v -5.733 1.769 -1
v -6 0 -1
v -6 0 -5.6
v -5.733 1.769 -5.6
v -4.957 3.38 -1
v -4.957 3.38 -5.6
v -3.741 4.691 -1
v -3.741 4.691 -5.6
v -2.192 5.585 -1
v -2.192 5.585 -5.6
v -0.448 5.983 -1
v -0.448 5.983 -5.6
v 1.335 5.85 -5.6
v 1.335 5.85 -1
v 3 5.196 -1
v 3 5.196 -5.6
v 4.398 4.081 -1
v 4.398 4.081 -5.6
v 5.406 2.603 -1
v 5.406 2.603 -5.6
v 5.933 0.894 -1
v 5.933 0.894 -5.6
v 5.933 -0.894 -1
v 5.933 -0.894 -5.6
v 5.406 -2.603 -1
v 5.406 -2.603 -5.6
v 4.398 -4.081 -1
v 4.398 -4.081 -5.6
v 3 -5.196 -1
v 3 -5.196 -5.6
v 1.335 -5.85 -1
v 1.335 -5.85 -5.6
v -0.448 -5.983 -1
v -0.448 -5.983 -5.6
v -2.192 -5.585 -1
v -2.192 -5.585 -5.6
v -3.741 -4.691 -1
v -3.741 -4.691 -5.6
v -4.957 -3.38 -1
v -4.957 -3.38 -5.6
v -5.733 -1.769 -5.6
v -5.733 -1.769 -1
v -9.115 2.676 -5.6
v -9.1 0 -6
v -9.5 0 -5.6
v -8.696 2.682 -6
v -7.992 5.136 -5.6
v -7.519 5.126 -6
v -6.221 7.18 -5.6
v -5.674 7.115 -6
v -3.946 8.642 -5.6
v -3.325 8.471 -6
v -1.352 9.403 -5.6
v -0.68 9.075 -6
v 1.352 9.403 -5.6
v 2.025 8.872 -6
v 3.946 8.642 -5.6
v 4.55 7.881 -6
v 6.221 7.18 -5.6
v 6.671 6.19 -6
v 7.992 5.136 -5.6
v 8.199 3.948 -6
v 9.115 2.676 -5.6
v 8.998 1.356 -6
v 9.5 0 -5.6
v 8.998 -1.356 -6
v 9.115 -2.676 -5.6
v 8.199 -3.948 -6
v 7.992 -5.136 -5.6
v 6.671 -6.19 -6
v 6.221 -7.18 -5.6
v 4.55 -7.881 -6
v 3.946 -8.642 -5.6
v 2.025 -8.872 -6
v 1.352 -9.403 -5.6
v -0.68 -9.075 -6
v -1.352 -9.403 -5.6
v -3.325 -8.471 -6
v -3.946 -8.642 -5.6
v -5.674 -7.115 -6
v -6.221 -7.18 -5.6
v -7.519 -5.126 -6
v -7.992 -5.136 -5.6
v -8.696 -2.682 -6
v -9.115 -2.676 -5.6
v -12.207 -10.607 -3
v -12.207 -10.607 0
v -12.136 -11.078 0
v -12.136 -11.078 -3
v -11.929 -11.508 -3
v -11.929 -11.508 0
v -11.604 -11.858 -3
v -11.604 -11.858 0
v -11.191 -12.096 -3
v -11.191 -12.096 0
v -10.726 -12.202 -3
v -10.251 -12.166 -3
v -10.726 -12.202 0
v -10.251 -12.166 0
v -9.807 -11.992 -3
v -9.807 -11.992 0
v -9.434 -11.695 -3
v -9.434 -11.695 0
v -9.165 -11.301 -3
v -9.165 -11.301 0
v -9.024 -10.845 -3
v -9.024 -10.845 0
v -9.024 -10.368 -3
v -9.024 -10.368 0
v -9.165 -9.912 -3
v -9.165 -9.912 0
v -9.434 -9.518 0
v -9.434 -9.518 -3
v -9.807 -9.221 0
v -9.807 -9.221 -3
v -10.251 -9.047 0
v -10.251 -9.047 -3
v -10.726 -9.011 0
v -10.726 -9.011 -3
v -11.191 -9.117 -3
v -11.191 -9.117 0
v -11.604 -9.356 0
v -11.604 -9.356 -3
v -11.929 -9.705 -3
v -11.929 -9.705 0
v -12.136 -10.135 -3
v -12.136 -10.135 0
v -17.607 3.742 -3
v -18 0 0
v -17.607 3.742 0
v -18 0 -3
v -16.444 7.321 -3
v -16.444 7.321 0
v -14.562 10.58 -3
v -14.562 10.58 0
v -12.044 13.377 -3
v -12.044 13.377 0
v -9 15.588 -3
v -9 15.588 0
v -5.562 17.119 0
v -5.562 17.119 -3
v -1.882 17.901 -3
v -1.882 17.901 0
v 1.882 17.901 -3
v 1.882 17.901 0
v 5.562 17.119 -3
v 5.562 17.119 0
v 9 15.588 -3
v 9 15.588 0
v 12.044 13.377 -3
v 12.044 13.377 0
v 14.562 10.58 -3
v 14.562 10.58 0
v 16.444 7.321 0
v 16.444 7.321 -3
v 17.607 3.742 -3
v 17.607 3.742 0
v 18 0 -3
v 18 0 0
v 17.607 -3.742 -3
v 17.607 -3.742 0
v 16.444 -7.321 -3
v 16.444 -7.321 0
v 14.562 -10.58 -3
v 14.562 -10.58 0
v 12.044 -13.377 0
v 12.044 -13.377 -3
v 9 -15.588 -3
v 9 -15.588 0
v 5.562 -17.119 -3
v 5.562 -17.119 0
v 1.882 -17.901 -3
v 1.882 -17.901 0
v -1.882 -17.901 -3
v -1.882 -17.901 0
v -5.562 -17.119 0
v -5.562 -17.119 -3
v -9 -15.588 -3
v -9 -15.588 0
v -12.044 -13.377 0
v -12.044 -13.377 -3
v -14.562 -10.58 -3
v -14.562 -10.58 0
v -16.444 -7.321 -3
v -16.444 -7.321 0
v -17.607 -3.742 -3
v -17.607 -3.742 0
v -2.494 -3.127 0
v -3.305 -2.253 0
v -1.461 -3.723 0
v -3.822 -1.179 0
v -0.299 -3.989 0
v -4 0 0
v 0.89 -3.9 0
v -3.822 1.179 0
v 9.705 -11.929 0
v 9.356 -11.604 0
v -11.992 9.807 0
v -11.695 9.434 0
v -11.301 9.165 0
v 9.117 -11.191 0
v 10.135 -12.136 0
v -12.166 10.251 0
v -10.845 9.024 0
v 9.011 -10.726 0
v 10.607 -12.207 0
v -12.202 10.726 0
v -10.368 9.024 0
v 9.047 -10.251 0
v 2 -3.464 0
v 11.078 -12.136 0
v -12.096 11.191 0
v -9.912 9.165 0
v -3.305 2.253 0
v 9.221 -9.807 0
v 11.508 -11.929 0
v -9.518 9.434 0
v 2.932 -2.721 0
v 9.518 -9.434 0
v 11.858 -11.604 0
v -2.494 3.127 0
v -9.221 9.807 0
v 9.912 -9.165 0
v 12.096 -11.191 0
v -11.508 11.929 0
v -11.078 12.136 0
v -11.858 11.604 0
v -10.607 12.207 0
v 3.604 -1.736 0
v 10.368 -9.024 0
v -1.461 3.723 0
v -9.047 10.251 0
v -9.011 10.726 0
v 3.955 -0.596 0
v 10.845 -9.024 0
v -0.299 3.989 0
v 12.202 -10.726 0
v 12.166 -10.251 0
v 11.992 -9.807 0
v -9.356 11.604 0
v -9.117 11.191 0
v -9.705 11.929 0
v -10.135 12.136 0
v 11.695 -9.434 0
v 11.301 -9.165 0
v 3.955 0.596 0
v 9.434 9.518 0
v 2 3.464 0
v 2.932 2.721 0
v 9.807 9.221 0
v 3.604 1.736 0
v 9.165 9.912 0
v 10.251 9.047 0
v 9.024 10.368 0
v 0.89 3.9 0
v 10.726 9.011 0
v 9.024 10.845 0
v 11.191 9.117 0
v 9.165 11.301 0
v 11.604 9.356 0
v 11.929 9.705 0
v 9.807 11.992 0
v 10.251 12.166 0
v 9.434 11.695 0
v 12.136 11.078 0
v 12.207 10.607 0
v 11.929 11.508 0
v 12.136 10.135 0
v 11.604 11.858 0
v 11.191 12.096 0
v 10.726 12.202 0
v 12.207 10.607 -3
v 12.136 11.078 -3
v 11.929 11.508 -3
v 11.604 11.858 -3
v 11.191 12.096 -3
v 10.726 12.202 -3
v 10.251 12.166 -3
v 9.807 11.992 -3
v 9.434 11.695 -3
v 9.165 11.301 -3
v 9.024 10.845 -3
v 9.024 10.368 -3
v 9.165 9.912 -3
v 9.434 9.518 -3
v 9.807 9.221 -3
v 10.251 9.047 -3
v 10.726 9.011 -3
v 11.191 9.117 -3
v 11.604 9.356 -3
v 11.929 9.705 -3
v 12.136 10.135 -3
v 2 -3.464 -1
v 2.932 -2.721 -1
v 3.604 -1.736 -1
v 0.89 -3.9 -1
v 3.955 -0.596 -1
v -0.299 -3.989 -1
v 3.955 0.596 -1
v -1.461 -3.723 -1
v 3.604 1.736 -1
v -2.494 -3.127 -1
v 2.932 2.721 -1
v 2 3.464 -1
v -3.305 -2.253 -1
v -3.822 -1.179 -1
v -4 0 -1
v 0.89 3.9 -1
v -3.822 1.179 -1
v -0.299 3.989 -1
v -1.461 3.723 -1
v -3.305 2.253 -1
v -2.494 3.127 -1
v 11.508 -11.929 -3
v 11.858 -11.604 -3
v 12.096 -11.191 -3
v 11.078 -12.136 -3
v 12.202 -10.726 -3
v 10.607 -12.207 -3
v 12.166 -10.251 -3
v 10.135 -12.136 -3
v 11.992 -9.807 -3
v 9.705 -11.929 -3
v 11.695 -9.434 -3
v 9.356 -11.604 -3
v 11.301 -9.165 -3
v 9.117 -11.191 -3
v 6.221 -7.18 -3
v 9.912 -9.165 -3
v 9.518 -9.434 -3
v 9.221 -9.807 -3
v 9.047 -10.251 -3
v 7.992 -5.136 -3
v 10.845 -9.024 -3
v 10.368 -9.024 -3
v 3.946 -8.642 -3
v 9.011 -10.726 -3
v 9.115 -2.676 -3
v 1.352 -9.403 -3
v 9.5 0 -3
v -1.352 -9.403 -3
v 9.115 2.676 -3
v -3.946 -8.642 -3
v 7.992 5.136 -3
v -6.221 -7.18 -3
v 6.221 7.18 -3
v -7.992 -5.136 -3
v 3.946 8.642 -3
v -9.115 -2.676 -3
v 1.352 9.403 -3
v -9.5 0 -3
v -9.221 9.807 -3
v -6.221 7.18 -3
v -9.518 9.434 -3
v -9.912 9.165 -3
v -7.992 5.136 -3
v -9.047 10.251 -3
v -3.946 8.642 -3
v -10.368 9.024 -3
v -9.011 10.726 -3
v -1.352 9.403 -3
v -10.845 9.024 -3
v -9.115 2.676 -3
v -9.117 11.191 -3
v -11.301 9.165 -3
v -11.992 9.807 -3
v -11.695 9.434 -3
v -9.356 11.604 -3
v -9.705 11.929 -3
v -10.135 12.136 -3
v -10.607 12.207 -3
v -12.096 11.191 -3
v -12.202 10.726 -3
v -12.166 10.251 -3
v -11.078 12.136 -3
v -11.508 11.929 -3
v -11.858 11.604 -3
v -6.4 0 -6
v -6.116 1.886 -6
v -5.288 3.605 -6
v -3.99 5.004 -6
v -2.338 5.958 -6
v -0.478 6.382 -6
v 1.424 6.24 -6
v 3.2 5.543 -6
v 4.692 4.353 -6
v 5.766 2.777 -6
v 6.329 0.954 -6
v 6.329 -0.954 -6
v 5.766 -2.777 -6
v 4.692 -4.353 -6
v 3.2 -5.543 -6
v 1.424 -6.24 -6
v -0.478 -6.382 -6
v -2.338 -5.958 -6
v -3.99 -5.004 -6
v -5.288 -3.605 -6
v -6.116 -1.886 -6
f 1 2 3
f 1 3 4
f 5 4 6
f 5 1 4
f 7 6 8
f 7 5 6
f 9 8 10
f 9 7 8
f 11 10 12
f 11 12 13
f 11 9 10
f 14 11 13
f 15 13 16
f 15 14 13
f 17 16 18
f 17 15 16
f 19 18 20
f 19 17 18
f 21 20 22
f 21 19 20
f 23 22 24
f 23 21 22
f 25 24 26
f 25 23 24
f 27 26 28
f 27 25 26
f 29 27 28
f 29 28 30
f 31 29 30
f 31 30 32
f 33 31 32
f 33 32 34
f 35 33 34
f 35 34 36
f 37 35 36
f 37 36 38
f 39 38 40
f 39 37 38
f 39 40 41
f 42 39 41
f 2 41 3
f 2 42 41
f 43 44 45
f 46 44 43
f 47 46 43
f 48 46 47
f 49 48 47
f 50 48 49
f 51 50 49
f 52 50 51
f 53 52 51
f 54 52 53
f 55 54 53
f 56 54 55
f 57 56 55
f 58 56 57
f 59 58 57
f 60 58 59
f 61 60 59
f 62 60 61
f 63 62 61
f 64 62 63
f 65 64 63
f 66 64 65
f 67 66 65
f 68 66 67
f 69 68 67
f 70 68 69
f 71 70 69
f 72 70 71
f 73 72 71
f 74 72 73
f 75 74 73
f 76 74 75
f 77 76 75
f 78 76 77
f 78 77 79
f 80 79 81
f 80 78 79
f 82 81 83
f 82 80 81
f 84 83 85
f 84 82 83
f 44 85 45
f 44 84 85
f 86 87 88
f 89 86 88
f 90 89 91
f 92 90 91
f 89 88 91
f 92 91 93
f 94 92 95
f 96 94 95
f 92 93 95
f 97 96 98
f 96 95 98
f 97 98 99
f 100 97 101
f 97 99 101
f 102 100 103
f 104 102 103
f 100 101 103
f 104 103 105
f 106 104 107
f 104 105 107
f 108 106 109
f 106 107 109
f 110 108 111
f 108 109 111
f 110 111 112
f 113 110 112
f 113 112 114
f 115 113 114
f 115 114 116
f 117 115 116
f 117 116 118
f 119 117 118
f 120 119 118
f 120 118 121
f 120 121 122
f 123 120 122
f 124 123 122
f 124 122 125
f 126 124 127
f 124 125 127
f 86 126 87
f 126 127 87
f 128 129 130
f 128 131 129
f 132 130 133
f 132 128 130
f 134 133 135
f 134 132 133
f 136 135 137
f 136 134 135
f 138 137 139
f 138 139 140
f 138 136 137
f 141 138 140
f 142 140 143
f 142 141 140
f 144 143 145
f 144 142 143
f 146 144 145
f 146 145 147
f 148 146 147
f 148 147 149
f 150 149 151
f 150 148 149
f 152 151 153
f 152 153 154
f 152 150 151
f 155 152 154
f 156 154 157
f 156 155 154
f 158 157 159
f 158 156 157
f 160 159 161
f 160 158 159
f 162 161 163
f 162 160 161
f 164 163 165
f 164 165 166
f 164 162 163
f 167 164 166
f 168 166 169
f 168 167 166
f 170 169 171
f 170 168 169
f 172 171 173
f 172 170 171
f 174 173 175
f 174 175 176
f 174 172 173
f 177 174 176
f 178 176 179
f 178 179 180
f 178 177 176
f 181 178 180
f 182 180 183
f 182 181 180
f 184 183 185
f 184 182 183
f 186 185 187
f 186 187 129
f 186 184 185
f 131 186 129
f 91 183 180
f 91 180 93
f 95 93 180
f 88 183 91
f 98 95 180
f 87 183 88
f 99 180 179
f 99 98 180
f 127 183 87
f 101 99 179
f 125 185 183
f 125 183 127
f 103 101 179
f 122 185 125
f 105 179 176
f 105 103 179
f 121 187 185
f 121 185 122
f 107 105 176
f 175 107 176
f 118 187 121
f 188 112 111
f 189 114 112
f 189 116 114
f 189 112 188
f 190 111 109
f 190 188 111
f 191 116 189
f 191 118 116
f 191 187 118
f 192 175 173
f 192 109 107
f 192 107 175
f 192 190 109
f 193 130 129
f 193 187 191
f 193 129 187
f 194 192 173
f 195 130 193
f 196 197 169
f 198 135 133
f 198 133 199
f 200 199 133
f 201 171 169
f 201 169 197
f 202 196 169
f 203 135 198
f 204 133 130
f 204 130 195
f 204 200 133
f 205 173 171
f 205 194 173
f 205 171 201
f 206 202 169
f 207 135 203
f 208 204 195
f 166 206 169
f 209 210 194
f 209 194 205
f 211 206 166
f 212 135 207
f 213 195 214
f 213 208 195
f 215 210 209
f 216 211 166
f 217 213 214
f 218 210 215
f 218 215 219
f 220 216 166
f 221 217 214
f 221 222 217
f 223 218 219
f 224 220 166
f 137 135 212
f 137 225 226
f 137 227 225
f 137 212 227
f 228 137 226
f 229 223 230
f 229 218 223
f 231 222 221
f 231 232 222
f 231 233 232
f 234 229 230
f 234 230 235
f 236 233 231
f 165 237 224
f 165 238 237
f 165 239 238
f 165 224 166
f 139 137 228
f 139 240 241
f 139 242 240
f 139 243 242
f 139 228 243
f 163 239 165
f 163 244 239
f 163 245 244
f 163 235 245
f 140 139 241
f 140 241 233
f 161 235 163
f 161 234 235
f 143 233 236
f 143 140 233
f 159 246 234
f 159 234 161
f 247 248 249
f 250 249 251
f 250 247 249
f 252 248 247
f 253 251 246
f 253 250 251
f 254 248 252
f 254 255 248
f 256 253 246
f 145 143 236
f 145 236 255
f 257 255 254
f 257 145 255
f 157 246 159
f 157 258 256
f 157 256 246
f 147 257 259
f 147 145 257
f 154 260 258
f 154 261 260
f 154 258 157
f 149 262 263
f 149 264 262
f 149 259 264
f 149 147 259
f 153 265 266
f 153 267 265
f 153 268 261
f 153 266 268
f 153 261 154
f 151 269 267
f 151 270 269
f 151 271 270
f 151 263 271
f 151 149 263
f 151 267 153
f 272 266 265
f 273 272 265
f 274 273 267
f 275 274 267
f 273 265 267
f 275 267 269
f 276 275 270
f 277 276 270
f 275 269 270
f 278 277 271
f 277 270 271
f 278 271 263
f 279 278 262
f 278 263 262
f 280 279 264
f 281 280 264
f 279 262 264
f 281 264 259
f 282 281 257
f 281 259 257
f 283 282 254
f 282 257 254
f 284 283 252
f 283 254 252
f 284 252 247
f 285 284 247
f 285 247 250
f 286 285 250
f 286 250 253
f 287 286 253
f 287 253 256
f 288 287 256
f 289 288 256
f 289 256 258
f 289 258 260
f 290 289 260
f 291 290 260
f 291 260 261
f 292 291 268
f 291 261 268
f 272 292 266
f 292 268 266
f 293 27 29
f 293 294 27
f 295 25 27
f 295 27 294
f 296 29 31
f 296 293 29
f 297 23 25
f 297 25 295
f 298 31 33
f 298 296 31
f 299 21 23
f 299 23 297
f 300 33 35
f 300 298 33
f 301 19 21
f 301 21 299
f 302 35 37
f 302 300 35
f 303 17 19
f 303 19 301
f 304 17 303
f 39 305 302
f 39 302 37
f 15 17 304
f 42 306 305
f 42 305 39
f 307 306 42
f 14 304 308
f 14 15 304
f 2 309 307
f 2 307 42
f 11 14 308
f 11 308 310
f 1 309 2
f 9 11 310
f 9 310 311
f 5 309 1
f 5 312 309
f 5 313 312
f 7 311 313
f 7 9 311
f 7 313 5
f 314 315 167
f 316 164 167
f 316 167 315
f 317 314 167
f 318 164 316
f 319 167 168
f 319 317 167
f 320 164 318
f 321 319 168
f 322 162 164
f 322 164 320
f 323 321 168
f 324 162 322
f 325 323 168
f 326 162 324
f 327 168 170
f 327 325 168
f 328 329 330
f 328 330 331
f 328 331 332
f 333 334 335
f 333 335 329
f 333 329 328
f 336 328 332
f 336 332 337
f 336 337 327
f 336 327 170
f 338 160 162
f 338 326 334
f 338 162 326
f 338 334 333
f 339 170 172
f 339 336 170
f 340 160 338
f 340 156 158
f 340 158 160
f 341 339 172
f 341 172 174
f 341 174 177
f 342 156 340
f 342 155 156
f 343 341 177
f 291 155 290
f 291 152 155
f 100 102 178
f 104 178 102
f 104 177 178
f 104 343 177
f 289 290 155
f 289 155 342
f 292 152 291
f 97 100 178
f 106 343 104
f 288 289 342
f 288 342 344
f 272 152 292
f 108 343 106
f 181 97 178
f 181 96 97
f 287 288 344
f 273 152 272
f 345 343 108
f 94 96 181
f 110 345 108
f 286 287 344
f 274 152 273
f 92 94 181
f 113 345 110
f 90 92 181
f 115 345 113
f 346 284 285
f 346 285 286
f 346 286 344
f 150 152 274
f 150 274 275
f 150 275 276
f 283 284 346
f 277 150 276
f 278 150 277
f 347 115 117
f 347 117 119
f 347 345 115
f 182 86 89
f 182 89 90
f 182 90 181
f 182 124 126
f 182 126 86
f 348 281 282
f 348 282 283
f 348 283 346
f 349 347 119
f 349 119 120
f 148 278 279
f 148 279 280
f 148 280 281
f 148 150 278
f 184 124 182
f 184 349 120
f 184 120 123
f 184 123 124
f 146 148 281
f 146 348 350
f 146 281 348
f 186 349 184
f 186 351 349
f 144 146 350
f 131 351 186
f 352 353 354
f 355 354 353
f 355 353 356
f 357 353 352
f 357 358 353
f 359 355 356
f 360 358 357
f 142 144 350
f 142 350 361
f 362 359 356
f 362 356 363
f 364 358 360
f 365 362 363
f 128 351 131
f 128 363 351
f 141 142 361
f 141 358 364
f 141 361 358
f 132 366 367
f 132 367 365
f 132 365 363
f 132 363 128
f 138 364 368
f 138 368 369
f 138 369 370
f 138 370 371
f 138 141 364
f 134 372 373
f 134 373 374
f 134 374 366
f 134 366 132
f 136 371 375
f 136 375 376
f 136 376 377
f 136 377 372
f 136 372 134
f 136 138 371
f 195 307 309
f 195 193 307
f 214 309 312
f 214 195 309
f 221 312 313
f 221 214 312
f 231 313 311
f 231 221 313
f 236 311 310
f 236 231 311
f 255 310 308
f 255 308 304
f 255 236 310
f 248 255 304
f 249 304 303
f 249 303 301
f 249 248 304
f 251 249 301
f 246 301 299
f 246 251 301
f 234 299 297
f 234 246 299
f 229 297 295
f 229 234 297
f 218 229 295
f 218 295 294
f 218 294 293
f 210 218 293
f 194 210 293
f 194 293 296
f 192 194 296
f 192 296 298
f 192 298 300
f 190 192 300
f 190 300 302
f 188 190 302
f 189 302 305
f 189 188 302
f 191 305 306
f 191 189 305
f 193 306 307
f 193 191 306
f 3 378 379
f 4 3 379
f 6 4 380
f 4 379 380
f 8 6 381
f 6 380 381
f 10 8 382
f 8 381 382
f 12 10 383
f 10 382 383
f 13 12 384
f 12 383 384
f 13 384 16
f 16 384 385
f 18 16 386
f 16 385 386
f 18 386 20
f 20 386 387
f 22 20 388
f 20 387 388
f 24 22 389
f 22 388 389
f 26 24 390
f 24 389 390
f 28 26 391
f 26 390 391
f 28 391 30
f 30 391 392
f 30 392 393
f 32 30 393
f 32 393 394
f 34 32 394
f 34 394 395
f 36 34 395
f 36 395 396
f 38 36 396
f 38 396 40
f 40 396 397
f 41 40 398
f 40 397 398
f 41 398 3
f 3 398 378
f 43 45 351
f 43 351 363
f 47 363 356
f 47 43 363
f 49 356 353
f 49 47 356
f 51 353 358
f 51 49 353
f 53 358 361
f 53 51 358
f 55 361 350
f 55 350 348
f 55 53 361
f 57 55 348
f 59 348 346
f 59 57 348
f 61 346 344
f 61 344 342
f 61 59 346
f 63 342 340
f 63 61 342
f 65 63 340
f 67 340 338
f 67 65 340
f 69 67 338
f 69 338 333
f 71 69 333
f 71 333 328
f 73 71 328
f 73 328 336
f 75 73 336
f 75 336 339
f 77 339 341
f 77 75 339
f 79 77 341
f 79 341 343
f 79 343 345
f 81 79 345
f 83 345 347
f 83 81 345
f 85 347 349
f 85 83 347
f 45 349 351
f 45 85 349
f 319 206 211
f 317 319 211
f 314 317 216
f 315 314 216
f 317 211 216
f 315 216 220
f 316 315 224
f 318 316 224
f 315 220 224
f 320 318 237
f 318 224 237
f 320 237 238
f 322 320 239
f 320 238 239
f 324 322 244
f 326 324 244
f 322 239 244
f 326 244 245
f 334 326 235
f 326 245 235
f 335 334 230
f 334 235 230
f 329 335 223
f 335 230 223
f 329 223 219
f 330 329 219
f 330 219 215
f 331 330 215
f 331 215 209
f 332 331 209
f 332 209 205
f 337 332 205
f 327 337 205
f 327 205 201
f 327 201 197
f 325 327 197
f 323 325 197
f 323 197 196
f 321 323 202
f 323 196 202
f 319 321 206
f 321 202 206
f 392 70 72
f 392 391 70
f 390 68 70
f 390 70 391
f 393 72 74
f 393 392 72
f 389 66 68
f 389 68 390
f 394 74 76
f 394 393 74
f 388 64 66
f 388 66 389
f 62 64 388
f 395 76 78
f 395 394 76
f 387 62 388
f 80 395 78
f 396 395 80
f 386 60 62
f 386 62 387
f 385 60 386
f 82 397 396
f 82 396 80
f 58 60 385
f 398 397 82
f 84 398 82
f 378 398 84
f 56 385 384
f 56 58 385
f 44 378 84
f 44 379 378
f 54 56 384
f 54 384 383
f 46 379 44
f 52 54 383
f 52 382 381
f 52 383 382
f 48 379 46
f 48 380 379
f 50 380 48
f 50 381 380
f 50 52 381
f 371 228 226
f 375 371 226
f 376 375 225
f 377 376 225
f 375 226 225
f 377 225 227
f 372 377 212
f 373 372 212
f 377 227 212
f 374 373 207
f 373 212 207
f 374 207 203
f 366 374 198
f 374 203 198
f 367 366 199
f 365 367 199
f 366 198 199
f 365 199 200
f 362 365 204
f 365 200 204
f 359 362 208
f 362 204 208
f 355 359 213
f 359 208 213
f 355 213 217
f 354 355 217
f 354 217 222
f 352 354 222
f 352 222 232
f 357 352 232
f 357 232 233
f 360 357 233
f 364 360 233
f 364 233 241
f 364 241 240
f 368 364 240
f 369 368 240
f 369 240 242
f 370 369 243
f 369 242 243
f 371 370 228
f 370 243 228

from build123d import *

# Parameters (mm, degrees)
SKETCH_2_R               = 1.6
CUT_EXTRUDE_1_DEPTH      = 3
PATTERN_CIRCULAR_1_COUNT = 4
CHAMFER_1_SIZE           = 0.4


with BuildPart() as part:
    # Эскиз1 → Повернуть1 (revolve)
    with BuildSketch(Plane(origin=(0, 0, 0), x_dir=(1, 0, 0), z_dir=(0, 1, 0))):
        Polygon((-4, 0), (-18, 0), (-18, 3), (-9.5, 3), (-9.5, 6), (-6, 6), (-6, 1), (-4, 1), align=None)
    revolve(axis=Axis((0, 0, 0), (0, 0, -1)))

    # Эскиз2 → Вырез-Вытянуть1 (cut)
    with BuildSketch(Plane.XY):
        with Locations((10.606601718, 10.606601718)):
            Circle(SKETCH_2_R)
    cut_extrude_1 = extrude(amount=-CUT_EXTRUDE_1_DEPTH, mode=Mode.SUBTRACT)

    # Круговой массив1: Вырез-Вытянуть1 ×4 about axis
    pattern_circular_1_axis = Axis((0, 0, 0), (0, 0, 1))
    for i in range(1, PATTERN_CIRCULAR_1_COUNT):
        add(cut_extrude_1.rotate(pattern_circular_1_axis, i * 360 / PATTERN_CIRCULAR_1_COUNT), mode=Mode.SUBTRACT)

    # Фаска1
    chamfer_1_edges = [part.edges().sort_by_distance(p)[0] for p in [
        (6, 0, -6),
        (9.5, 0, -6),
    ]]
    chamfer(chamfer_1_edges, length=CHAMFER_1_SIZE)


solid = part.part
